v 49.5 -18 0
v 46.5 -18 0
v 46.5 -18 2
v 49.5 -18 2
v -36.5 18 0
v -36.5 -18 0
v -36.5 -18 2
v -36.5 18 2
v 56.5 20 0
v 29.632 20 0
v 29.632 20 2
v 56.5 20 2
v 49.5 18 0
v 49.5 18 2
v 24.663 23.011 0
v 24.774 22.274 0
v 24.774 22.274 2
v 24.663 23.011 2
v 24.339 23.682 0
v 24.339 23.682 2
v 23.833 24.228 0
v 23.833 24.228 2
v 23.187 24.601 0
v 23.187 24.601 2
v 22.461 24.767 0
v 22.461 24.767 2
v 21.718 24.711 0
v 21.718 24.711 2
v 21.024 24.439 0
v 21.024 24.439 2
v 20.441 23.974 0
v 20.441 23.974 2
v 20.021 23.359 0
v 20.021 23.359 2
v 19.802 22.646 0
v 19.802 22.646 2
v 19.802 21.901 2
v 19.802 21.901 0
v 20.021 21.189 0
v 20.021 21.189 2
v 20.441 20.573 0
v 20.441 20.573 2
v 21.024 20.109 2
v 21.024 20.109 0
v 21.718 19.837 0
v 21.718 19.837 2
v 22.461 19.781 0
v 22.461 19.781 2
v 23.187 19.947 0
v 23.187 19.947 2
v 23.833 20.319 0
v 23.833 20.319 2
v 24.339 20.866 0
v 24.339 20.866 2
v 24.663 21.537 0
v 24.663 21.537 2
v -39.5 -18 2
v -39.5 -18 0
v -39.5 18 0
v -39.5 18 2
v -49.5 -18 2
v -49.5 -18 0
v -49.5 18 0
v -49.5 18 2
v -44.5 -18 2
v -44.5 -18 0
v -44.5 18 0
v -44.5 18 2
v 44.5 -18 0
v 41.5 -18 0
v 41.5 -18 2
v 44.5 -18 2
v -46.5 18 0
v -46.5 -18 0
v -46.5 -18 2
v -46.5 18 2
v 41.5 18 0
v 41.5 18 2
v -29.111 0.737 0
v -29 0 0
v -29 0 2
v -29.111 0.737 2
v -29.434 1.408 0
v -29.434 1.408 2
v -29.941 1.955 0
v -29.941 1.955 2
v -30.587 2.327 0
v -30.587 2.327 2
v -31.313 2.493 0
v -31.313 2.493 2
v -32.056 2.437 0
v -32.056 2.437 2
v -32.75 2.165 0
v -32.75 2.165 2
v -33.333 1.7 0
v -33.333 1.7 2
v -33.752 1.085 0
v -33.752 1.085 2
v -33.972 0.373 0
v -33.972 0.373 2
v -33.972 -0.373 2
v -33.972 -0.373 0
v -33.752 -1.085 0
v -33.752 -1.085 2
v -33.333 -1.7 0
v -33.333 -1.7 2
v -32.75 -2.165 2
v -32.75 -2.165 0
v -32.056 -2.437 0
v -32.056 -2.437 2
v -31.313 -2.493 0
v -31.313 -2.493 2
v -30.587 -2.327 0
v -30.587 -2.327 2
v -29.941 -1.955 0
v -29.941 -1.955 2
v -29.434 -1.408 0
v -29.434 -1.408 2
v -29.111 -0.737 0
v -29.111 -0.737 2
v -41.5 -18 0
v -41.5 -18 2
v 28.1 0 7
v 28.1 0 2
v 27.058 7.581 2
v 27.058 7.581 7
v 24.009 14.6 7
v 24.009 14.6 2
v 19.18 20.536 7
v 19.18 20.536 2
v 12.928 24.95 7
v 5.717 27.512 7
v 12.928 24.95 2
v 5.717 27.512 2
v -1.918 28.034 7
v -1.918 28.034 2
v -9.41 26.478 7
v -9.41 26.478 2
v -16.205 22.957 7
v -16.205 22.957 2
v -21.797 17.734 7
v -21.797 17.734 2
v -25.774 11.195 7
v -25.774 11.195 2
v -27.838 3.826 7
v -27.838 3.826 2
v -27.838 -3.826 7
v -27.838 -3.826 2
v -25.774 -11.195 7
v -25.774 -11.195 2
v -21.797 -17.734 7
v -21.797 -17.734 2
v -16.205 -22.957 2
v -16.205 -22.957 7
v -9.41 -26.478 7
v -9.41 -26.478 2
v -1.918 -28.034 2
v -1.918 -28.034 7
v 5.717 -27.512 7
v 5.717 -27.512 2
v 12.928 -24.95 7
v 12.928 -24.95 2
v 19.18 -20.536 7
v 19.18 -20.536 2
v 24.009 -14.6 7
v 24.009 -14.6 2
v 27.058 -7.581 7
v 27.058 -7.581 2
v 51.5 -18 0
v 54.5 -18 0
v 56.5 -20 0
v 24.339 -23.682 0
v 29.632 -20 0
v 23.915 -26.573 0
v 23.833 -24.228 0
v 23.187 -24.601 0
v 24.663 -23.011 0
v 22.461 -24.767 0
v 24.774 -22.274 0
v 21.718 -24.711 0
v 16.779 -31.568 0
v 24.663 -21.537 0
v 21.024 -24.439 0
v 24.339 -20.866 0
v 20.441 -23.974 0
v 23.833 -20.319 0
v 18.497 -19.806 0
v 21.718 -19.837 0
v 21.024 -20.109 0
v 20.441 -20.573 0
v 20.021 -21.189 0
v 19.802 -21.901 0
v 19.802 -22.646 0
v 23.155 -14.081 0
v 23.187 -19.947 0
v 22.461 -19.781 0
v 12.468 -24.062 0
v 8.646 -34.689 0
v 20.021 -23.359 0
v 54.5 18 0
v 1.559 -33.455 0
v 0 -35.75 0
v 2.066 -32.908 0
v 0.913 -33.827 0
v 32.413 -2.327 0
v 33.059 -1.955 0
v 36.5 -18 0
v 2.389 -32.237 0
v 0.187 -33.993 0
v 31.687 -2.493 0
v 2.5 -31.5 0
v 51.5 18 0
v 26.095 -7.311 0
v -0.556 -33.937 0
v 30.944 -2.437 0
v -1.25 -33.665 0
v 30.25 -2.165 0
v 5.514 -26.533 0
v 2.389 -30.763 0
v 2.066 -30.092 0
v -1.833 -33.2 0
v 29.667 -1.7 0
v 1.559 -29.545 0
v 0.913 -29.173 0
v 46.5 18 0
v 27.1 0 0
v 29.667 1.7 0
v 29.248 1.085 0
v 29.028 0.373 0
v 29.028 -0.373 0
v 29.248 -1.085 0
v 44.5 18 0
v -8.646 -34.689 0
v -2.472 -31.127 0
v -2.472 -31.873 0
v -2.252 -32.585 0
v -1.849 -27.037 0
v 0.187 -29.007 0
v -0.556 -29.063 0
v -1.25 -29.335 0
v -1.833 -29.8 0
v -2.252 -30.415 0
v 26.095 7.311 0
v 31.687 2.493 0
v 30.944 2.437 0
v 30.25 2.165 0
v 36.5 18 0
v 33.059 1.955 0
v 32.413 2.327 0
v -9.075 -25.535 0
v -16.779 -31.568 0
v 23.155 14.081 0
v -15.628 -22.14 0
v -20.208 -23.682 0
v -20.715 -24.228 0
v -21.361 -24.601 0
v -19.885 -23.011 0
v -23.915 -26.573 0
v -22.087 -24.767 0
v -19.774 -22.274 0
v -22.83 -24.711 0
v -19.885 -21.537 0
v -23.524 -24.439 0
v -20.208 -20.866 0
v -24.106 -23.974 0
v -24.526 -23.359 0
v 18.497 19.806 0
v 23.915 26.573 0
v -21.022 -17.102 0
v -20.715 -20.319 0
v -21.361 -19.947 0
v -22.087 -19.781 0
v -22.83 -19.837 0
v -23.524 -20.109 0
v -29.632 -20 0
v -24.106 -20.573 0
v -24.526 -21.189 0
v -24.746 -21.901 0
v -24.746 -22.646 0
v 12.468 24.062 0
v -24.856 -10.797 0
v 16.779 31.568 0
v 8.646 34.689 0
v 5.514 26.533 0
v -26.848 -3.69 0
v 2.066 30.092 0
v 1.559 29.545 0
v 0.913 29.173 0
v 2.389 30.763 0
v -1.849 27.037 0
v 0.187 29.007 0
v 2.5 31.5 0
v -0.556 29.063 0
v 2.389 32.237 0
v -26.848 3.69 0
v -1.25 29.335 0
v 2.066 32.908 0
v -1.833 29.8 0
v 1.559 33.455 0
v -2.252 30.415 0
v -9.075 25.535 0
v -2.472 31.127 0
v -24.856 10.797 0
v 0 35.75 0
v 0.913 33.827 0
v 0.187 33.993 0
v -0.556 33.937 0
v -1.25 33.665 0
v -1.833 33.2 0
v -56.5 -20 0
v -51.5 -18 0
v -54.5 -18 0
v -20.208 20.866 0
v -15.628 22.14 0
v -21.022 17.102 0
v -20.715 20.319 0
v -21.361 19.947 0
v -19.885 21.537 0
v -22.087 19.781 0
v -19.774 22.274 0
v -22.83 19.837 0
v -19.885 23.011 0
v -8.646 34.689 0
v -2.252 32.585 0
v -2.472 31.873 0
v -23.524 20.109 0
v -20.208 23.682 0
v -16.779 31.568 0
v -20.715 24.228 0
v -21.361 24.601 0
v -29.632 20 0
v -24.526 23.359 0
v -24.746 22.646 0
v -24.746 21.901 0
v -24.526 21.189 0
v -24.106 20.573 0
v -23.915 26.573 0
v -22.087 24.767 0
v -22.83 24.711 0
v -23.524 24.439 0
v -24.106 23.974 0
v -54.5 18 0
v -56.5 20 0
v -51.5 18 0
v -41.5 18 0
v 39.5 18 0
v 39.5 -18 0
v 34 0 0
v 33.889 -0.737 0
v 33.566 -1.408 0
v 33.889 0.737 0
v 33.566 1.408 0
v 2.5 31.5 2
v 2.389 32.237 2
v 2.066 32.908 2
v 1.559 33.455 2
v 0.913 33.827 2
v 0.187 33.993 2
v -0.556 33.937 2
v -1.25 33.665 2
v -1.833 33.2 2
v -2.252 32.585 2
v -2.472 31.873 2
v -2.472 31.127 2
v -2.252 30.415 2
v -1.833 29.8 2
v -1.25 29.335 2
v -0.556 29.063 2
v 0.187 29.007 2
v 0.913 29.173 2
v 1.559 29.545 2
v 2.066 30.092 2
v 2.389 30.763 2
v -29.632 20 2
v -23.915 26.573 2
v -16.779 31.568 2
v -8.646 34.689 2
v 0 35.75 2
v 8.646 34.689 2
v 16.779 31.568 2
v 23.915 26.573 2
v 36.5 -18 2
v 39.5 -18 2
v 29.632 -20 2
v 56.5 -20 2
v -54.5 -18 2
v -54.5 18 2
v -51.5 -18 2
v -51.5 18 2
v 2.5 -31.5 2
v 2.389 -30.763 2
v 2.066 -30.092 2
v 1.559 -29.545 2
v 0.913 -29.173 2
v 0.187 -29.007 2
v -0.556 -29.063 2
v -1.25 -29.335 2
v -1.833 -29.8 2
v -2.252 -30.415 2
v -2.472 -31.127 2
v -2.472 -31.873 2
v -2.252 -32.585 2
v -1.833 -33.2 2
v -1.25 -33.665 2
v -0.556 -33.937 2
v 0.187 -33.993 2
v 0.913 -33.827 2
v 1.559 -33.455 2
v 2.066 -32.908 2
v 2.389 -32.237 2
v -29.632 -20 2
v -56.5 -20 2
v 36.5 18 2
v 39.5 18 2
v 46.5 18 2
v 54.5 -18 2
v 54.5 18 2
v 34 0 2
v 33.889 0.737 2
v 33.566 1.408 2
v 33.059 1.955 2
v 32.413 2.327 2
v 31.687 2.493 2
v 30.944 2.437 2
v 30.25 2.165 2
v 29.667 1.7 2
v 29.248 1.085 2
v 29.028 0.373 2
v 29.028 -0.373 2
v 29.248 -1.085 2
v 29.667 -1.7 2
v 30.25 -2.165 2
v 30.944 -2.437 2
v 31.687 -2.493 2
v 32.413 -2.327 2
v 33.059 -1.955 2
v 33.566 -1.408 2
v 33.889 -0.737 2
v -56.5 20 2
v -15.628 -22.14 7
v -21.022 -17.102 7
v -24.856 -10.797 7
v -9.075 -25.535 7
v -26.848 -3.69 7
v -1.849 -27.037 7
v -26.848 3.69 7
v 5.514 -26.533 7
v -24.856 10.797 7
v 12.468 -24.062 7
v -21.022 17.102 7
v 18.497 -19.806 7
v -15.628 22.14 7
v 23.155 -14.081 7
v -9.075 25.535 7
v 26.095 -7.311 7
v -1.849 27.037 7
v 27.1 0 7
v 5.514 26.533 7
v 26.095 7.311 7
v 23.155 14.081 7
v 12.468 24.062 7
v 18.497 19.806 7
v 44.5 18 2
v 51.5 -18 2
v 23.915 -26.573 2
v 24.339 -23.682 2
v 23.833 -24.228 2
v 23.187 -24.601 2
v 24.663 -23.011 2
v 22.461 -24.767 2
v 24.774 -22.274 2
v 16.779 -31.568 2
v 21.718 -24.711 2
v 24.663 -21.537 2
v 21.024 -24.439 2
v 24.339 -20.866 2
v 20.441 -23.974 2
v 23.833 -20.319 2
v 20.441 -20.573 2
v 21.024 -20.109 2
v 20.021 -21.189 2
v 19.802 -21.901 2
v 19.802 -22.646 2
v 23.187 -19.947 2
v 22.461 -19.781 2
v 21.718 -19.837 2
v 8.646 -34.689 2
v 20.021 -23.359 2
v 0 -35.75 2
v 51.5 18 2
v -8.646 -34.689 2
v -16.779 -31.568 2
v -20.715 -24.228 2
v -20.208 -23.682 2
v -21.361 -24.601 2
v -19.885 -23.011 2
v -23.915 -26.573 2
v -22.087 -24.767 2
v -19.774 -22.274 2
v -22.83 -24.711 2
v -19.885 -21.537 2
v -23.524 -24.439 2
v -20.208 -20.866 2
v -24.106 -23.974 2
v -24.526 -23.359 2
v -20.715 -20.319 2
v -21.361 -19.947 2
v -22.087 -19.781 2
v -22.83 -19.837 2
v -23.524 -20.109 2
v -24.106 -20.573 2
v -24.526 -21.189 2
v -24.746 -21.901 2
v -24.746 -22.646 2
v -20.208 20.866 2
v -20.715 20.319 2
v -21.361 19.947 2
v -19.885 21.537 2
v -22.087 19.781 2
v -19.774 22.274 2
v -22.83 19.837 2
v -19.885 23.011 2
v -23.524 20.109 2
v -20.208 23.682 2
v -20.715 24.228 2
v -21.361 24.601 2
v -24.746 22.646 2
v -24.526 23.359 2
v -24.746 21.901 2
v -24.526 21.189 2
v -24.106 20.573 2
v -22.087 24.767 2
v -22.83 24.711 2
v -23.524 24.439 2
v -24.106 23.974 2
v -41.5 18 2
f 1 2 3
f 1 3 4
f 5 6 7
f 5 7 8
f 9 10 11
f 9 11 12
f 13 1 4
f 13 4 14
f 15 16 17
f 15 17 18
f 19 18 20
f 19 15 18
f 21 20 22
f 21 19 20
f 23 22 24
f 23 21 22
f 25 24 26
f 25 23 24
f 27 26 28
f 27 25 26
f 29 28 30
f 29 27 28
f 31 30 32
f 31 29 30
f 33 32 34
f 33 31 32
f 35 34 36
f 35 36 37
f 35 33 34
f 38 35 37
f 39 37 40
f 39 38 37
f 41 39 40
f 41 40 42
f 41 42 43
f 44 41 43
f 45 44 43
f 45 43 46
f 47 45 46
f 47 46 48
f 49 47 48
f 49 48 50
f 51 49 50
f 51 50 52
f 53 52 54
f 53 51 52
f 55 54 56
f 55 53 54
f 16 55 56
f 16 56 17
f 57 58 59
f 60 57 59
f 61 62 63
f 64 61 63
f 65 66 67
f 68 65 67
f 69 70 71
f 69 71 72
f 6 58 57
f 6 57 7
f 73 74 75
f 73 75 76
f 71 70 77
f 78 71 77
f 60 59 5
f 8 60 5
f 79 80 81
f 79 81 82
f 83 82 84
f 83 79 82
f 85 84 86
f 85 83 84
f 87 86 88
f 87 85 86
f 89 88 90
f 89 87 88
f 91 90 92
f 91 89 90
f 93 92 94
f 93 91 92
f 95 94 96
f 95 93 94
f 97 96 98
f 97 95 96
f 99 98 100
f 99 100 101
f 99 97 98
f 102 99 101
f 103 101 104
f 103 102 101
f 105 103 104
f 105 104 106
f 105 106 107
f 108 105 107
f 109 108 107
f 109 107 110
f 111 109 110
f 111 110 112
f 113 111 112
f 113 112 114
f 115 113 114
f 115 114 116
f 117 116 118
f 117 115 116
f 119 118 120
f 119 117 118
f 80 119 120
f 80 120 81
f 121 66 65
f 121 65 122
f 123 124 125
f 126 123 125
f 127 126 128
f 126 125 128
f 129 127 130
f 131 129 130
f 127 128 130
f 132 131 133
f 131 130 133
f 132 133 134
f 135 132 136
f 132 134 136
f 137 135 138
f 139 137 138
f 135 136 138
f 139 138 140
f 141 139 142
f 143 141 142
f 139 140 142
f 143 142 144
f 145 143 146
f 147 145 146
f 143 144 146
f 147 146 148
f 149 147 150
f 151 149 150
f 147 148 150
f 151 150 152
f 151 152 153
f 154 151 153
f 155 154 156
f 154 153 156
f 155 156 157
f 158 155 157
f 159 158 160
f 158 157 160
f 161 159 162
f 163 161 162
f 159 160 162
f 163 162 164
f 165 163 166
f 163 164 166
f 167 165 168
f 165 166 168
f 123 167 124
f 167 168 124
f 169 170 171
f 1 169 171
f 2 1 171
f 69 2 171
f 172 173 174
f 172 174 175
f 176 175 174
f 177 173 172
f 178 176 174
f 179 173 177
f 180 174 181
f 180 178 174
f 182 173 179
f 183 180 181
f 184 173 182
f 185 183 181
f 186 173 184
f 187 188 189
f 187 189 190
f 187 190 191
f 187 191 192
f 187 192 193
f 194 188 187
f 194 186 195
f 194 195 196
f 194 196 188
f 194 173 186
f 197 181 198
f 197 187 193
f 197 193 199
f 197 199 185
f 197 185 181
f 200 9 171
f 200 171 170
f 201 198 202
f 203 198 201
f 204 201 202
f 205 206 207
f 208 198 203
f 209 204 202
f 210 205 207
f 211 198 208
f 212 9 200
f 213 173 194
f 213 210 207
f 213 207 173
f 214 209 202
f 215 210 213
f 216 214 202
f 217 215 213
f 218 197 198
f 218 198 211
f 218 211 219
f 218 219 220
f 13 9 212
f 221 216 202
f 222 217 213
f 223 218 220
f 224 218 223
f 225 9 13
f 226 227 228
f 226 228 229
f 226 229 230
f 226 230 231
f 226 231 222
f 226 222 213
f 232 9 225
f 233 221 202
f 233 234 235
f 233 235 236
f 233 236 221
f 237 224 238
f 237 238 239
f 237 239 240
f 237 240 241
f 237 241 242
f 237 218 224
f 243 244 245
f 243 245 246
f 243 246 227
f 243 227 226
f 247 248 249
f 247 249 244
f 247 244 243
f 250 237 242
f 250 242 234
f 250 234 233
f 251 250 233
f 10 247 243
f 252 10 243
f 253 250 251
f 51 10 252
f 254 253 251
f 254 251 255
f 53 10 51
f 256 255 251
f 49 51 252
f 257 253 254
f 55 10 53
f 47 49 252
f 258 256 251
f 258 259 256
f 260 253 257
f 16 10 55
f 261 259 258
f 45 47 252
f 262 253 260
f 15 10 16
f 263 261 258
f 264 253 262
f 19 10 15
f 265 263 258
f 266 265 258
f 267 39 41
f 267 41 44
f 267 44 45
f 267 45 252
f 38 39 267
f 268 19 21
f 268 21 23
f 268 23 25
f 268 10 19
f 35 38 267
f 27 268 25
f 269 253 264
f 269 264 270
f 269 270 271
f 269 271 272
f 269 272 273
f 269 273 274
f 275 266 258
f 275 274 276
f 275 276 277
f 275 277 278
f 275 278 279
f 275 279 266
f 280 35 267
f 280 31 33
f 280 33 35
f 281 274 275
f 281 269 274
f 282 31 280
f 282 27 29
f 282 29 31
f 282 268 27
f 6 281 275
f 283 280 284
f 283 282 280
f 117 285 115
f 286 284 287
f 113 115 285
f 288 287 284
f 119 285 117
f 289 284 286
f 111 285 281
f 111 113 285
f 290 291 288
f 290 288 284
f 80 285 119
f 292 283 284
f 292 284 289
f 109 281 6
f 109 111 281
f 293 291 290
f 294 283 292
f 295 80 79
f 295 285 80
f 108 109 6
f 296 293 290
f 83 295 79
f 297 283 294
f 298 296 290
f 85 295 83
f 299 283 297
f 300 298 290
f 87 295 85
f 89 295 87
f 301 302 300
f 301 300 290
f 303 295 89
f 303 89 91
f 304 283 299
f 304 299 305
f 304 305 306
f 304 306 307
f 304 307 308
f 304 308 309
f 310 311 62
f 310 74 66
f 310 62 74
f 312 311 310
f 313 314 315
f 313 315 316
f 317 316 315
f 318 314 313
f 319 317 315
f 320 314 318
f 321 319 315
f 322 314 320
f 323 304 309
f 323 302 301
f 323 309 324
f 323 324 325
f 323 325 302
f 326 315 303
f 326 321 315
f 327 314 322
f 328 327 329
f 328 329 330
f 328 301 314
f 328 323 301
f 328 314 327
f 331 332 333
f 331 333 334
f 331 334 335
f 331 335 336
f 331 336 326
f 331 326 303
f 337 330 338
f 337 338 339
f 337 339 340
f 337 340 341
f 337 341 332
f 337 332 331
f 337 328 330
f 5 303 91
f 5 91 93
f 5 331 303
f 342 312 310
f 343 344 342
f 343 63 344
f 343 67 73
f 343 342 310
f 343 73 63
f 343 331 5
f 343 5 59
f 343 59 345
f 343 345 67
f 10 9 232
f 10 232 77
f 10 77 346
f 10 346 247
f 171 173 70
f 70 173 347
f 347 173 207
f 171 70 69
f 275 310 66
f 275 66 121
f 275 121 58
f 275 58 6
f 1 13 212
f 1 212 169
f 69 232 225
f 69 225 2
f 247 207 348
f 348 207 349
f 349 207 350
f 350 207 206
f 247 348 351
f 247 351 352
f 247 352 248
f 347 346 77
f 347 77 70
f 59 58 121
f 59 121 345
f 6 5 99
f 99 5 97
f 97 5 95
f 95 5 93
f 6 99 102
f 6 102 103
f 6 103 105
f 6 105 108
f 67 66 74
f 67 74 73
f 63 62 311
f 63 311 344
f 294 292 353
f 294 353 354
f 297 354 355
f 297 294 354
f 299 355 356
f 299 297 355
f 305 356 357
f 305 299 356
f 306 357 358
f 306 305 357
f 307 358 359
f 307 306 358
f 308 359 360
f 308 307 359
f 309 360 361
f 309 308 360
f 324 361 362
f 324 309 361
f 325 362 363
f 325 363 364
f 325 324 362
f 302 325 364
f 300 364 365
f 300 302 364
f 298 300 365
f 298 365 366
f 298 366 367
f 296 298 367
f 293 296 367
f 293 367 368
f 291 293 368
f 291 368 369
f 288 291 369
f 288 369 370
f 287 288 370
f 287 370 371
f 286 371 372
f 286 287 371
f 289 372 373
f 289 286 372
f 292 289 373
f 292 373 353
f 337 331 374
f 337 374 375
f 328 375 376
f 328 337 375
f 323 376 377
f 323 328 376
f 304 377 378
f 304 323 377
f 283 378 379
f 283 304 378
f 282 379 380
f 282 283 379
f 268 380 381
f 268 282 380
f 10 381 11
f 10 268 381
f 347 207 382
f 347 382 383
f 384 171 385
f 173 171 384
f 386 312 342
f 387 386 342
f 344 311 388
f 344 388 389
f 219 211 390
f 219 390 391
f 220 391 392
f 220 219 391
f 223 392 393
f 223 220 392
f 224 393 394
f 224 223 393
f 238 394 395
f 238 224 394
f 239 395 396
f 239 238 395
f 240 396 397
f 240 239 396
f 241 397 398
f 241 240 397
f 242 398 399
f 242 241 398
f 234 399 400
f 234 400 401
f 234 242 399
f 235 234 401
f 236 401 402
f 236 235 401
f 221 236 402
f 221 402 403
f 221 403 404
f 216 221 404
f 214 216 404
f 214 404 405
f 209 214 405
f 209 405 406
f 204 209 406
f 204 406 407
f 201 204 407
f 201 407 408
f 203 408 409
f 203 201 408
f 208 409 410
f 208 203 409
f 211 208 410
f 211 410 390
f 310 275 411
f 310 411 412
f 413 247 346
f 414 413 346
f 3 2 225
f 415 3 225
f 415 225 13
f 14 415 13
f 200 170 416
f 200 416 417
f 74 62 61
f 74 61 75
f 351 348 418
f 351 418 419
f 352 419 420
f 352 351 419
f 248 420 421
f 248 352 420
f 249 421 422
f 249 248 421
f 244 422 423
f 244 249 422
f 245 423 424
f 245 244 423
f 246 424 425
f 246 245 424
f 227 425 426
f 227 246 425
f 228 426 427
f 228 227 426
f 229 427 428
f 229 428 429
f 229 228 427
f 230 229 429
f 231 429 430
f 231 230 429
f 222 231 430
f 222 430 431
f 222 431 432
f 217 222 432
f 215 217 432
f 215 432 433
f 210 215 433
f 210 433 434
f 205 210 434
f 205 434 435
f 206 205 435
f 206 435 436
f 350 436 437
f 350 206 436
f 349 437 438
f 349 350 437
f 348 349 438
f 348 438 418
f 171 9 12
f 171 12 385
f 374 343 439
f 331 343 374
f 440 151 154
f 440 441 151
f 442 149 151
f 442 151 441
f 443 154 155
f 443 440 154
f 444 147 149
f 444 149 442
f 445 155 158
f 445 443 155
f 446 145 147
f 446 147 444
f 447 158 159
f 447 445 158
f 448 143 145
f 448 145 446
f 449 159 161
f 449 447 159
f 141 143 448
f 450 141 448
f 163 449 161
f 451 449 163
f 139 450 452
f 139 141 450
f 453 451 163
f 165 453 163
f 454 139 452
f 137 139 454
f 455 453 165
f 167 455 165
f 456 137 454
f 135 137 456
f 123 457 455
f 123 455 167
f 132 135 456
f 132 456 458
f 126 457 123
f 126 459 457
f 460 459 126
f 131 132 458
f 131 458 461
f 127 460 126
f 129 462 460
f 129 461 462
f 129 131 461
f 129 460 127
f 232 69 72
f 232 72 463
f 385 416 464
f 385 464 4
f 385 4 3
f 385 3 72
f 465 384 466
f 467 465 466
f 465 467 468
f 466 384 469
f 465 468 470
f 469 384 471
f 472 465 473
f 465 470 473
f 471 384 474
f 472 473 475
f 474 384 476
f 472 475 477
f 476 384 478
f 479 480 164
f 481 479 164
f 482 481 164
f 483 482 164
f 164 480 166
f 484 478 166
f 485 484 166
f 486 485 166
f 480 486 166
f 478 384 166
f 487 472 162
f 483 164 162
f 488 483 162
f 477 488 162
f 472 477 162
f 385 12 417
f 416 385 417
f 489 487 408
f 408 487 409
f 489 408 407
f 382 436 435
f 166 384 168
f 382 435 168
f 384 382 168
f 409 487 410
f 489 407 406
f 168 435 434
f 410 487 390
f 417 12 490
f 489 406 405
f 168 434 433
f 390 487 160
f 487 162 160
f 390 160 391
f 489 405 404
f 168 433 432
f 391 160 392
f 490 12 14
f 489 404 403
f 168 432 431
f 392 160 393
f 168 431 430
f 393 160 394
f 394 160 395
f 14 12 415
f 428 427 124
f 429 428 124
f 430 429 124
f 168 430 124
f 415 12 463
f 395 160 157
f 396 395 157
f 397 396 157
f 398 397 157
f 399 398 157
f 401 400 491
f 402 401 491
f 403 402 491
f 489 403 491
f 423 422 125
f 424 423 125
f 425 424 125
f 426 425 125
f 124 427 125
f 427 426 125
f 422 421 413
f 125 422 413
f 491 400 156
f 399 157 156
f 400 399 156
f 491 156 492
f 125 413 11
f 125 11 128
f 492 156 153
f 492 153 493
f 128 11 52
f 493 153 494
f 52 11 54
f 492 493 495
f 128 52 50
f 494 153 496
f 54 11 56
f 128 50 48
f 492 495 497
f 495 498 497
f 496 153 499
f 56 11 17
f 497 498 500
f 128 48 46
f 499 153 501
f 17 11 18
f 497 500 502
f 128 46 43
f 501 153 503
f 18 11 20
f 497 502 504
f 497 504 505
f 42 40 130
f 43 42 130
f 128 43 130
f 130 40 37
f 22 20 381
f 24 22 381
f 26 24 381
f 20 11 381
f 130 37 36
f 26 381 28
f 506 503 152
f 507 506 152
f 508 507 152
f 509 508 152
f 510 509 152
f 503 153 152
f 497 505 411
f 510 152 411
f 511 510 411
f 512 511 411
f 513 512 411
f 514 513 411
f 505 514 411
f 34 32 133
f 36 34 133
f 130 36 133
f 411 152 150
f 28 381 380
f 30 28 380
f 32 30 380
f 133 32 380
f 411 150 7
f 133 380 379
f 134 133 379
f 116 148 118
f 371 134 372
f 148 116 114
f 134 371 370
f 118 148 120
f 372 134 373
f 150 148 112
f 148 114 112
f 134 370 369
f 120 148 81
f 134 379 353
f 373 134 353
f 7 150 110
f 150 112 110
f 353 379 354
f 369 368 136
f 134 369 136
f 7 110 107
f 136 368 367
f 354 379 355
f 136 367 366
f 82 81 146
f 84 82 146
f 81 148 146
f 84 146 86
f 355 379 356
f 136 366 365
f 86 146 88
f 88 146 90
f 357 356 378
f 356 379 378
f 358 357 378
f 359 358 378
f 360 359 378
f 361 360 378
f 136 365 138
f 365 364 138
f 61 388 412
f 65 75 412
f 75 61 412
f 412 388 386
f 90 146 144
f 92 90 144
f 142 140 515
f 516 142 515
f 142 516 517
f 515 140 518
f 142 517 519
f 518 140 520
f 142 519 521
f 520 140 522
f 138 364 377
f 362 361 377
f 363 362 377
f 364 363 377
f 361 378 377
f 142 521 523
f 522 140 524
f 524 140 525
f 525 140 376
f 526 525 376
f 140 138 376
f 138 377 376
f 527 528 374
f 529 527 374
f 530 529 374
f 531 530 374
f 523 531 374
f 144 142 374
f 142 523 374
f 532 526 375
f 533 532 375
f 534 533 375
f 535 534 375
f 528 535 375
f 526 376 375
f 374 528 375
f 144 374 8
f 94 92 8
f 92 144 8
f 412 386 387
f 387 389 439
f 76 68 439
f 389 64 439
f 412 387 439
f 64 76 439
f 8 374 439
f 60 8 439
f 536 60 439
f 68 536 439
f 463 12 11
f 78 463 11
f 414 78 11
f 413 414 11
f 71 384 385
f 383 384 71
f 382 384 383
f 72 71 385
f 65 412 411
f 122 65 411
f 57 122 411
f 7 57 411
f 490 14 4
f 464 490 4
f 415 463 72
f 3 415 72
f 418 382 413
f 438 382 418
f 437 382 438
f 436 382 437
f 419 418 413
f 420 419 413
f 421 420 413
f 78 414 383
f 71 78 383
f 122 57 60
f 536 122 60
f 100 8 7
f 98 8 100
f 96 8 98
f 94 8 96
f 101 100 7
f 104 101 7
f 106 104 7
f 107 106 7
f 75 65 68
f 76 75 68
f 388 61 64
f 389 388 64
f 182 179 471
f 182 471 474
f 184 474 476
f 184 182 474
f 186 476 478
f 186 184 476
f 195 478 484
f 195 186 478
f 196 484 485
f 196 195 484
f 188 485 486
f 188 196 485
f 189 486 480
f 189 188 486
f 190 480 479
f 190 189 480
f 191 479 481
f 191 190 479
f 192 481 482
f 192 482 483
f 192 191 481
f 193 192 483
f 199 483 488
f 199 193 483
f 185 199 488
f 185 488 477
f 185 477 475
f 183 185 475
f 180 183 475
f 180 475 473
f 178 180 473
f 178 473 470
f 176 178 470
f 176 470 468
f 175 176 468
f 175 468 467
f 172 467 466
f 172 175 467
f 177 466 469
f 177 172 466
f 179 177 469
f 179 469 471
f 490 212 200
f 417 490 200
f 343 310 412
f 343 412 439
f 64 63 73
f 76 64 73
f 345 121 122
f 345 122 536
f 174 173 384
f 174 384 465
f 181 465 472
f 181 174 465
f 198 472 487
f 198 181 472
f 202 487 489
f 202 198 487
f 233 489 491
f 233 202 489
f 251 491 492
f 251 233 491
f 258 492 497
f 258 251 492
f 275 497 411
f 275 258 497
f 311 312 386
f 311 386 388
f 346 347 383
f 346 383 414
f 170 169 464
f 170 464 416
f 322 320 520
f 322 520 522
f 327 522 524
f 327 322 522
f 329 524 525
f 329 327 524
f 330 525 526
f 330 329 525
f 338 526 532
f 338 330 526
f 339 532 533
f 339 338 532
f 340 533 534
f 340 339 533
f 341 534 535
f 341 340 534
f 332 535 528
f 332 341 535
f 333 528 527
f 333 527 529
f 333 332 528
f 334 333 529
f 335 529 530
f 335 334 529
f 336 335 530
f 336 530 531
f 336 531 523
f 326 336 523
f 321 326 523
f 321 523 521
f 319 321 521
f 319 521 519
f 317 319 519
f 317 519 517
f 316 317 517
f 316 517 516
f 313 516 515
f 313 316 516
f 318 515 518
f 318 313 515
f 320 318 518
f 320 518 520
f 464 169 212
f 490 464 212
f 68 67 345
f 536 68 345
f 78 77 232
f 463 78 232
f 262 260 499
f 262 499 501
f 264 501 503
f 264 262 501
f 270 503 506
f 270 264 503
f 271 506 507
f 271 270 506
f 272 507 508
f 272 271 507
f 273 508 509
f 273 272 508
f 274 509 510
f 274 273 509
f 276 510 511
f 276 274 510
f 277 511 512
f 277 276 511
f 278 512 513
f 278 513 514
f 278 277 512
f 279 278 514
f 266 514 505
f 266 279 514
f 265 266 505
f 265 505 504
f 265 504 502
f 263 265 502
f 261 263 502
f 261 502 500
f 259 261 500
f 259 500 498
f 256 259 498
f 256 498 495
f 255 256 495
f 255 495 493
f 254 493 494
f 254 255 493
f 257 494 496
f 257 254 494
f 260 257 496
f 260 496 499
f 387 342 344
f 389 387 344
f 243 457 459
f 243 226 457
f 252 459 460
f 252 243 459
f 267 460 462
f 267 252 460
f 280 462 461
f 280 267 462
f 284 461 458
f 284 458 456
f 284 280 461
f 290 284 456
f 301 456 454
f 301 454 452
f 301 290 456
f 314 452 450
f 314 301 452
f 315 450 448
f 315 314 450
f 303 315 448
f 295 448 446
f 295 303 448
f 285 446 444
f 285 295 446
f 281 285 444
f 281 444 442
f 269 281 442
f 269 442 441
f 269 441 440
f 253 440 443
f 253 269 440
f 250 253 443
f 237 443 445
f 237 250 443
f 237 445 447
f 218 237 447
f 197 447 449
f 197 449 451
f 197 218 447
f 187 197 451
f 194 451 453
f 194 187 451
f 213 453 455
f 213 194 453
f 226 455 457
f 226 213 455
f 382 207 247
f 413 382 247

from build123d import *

# Parameters (mm, degrees)
CROQUIS1_R              = 27.1
CROQUIS1_R_2            = 2.5
CROQUIS1_W              = 3
CROQUIS1_H              = 36
SALIENTE_EXTRUIR1_DEPTH = 2
CROQUIS2_R              = 28.1
CROQUIS2_R_2            = 27.1
SALIENTE_EXTRUIR2_DEPTH = 5


with BuildPart() as part:
    # Croquis1 → Saliente-Extruir1 (new body)
    with BuildSketch(Plane.XY):
        with BuildLine():
            Line((-56.5, 20), (-29.632119398, 20))
            ThreePointArc((-29.632119398, 20), (0, 35.75), (29.632119398, 20))
            Line((29.632119398, 20), (56.5, 20))
            Line((56.5, 20), (56.5, -20))
            Line((56.5, -20), (29.632119398, -20))
            ThreePointArc((29.632119398, -20), (0, -35.75), (-29.632119398, -20))
            Line((-29.632119398, -20), (-56.5, -20))
            Line((-56.5, -20), (-56.5, 20))
        make_face()
        Circle(CROQUIS1_R, mode=Mode.SUBTRACT)
        with Locations((31.5, 0)):
            Circle(CROQUIS1_R_2, mode=Mode.SUBTRACT)
        with Locations((22.273863607, -22.273863607)):
            Circle(CROQUIS1_R_2, mode=Mode.SUBTRACT)
        with Locations((0, -31.5)):
            Circle(CROQUIS1_R_2, mode=Mode.SUBTRACT)
        with Locations((-22.273863607, -22.273863607)):
            Circle(CROQUIS1_R_2, mode=Mode.SUBTRACT)
        with Locations((-31.5, 0)):
            Circle(CROQUIS1_R_2, mode=Mode.SUBTRACT)
        with Locations((-22.273863607, 22.273863607)):
            Circle(CROQUIS1_R_2, mode=Mode.SUBTRACT)
        with Locations((0, 31.5)):
            Circle(CROQUIS1_R_2, mode=Mode.SUBTRACT)
        with Locations((22.273863607, 22.273863607)):
            Circle(CROQUIS1_R_2, mode=Mode.SUBTRACT)
        with Locations((-48, 0)):
            Rectangle(CROQUIS1_W, CROQUIS1_H, mode=Mode.SUBTRACT)
        with Locations((-53, 0)):
            Rectangle(CROQUIS1_W, CROQUIS1_H, mode=Mode.SUBTRACT)
        with Locations((-43, 0)):
            Rectangle(CROQUIS1_W, CROQUIS1_H, mode=Mode.SUBTRACT)
        with Locations((-38, 0)):
            Rectangle(CROQUIS1_W, CROQUIS1_H, mode=Mode.SUBTRACT)
        with Locations((38, 0)):
            Rectangle(CROQUIS1_W, CROQUIS1_H, mode=Mode.SUBTRACT)
        with Locations((43, 0)):
            Rectangle(CROQUIS1_W, CROQUIS1_H, mode=Mode.SUBTRACT)
        with Locations((48, 0)):
            Rectangle(CROQUIS1_W, CROQUIS1_H, mode=Mode.SUBTRACT)
        with Locations((53, 0)):
            Rectangle(CROQUIS1_W, CROQUIS1_H, mode=Mode.SUBTRACT)
    extrude(amount=SALIENTE_EXTRUIR1_DEPTH)

    # Croquis2 → Saliente-Extruir2 (add)
    with BuildSketch(Plane.XY.offset(2)):
        Circle(CROQUIS2_R)
        Circle(CROQUIS2_R_2, mode=Mode.SUBTRACT)
    extrude(amount=SALIENTE_EXTRUIR2_DEPTH)


solid = part.part
